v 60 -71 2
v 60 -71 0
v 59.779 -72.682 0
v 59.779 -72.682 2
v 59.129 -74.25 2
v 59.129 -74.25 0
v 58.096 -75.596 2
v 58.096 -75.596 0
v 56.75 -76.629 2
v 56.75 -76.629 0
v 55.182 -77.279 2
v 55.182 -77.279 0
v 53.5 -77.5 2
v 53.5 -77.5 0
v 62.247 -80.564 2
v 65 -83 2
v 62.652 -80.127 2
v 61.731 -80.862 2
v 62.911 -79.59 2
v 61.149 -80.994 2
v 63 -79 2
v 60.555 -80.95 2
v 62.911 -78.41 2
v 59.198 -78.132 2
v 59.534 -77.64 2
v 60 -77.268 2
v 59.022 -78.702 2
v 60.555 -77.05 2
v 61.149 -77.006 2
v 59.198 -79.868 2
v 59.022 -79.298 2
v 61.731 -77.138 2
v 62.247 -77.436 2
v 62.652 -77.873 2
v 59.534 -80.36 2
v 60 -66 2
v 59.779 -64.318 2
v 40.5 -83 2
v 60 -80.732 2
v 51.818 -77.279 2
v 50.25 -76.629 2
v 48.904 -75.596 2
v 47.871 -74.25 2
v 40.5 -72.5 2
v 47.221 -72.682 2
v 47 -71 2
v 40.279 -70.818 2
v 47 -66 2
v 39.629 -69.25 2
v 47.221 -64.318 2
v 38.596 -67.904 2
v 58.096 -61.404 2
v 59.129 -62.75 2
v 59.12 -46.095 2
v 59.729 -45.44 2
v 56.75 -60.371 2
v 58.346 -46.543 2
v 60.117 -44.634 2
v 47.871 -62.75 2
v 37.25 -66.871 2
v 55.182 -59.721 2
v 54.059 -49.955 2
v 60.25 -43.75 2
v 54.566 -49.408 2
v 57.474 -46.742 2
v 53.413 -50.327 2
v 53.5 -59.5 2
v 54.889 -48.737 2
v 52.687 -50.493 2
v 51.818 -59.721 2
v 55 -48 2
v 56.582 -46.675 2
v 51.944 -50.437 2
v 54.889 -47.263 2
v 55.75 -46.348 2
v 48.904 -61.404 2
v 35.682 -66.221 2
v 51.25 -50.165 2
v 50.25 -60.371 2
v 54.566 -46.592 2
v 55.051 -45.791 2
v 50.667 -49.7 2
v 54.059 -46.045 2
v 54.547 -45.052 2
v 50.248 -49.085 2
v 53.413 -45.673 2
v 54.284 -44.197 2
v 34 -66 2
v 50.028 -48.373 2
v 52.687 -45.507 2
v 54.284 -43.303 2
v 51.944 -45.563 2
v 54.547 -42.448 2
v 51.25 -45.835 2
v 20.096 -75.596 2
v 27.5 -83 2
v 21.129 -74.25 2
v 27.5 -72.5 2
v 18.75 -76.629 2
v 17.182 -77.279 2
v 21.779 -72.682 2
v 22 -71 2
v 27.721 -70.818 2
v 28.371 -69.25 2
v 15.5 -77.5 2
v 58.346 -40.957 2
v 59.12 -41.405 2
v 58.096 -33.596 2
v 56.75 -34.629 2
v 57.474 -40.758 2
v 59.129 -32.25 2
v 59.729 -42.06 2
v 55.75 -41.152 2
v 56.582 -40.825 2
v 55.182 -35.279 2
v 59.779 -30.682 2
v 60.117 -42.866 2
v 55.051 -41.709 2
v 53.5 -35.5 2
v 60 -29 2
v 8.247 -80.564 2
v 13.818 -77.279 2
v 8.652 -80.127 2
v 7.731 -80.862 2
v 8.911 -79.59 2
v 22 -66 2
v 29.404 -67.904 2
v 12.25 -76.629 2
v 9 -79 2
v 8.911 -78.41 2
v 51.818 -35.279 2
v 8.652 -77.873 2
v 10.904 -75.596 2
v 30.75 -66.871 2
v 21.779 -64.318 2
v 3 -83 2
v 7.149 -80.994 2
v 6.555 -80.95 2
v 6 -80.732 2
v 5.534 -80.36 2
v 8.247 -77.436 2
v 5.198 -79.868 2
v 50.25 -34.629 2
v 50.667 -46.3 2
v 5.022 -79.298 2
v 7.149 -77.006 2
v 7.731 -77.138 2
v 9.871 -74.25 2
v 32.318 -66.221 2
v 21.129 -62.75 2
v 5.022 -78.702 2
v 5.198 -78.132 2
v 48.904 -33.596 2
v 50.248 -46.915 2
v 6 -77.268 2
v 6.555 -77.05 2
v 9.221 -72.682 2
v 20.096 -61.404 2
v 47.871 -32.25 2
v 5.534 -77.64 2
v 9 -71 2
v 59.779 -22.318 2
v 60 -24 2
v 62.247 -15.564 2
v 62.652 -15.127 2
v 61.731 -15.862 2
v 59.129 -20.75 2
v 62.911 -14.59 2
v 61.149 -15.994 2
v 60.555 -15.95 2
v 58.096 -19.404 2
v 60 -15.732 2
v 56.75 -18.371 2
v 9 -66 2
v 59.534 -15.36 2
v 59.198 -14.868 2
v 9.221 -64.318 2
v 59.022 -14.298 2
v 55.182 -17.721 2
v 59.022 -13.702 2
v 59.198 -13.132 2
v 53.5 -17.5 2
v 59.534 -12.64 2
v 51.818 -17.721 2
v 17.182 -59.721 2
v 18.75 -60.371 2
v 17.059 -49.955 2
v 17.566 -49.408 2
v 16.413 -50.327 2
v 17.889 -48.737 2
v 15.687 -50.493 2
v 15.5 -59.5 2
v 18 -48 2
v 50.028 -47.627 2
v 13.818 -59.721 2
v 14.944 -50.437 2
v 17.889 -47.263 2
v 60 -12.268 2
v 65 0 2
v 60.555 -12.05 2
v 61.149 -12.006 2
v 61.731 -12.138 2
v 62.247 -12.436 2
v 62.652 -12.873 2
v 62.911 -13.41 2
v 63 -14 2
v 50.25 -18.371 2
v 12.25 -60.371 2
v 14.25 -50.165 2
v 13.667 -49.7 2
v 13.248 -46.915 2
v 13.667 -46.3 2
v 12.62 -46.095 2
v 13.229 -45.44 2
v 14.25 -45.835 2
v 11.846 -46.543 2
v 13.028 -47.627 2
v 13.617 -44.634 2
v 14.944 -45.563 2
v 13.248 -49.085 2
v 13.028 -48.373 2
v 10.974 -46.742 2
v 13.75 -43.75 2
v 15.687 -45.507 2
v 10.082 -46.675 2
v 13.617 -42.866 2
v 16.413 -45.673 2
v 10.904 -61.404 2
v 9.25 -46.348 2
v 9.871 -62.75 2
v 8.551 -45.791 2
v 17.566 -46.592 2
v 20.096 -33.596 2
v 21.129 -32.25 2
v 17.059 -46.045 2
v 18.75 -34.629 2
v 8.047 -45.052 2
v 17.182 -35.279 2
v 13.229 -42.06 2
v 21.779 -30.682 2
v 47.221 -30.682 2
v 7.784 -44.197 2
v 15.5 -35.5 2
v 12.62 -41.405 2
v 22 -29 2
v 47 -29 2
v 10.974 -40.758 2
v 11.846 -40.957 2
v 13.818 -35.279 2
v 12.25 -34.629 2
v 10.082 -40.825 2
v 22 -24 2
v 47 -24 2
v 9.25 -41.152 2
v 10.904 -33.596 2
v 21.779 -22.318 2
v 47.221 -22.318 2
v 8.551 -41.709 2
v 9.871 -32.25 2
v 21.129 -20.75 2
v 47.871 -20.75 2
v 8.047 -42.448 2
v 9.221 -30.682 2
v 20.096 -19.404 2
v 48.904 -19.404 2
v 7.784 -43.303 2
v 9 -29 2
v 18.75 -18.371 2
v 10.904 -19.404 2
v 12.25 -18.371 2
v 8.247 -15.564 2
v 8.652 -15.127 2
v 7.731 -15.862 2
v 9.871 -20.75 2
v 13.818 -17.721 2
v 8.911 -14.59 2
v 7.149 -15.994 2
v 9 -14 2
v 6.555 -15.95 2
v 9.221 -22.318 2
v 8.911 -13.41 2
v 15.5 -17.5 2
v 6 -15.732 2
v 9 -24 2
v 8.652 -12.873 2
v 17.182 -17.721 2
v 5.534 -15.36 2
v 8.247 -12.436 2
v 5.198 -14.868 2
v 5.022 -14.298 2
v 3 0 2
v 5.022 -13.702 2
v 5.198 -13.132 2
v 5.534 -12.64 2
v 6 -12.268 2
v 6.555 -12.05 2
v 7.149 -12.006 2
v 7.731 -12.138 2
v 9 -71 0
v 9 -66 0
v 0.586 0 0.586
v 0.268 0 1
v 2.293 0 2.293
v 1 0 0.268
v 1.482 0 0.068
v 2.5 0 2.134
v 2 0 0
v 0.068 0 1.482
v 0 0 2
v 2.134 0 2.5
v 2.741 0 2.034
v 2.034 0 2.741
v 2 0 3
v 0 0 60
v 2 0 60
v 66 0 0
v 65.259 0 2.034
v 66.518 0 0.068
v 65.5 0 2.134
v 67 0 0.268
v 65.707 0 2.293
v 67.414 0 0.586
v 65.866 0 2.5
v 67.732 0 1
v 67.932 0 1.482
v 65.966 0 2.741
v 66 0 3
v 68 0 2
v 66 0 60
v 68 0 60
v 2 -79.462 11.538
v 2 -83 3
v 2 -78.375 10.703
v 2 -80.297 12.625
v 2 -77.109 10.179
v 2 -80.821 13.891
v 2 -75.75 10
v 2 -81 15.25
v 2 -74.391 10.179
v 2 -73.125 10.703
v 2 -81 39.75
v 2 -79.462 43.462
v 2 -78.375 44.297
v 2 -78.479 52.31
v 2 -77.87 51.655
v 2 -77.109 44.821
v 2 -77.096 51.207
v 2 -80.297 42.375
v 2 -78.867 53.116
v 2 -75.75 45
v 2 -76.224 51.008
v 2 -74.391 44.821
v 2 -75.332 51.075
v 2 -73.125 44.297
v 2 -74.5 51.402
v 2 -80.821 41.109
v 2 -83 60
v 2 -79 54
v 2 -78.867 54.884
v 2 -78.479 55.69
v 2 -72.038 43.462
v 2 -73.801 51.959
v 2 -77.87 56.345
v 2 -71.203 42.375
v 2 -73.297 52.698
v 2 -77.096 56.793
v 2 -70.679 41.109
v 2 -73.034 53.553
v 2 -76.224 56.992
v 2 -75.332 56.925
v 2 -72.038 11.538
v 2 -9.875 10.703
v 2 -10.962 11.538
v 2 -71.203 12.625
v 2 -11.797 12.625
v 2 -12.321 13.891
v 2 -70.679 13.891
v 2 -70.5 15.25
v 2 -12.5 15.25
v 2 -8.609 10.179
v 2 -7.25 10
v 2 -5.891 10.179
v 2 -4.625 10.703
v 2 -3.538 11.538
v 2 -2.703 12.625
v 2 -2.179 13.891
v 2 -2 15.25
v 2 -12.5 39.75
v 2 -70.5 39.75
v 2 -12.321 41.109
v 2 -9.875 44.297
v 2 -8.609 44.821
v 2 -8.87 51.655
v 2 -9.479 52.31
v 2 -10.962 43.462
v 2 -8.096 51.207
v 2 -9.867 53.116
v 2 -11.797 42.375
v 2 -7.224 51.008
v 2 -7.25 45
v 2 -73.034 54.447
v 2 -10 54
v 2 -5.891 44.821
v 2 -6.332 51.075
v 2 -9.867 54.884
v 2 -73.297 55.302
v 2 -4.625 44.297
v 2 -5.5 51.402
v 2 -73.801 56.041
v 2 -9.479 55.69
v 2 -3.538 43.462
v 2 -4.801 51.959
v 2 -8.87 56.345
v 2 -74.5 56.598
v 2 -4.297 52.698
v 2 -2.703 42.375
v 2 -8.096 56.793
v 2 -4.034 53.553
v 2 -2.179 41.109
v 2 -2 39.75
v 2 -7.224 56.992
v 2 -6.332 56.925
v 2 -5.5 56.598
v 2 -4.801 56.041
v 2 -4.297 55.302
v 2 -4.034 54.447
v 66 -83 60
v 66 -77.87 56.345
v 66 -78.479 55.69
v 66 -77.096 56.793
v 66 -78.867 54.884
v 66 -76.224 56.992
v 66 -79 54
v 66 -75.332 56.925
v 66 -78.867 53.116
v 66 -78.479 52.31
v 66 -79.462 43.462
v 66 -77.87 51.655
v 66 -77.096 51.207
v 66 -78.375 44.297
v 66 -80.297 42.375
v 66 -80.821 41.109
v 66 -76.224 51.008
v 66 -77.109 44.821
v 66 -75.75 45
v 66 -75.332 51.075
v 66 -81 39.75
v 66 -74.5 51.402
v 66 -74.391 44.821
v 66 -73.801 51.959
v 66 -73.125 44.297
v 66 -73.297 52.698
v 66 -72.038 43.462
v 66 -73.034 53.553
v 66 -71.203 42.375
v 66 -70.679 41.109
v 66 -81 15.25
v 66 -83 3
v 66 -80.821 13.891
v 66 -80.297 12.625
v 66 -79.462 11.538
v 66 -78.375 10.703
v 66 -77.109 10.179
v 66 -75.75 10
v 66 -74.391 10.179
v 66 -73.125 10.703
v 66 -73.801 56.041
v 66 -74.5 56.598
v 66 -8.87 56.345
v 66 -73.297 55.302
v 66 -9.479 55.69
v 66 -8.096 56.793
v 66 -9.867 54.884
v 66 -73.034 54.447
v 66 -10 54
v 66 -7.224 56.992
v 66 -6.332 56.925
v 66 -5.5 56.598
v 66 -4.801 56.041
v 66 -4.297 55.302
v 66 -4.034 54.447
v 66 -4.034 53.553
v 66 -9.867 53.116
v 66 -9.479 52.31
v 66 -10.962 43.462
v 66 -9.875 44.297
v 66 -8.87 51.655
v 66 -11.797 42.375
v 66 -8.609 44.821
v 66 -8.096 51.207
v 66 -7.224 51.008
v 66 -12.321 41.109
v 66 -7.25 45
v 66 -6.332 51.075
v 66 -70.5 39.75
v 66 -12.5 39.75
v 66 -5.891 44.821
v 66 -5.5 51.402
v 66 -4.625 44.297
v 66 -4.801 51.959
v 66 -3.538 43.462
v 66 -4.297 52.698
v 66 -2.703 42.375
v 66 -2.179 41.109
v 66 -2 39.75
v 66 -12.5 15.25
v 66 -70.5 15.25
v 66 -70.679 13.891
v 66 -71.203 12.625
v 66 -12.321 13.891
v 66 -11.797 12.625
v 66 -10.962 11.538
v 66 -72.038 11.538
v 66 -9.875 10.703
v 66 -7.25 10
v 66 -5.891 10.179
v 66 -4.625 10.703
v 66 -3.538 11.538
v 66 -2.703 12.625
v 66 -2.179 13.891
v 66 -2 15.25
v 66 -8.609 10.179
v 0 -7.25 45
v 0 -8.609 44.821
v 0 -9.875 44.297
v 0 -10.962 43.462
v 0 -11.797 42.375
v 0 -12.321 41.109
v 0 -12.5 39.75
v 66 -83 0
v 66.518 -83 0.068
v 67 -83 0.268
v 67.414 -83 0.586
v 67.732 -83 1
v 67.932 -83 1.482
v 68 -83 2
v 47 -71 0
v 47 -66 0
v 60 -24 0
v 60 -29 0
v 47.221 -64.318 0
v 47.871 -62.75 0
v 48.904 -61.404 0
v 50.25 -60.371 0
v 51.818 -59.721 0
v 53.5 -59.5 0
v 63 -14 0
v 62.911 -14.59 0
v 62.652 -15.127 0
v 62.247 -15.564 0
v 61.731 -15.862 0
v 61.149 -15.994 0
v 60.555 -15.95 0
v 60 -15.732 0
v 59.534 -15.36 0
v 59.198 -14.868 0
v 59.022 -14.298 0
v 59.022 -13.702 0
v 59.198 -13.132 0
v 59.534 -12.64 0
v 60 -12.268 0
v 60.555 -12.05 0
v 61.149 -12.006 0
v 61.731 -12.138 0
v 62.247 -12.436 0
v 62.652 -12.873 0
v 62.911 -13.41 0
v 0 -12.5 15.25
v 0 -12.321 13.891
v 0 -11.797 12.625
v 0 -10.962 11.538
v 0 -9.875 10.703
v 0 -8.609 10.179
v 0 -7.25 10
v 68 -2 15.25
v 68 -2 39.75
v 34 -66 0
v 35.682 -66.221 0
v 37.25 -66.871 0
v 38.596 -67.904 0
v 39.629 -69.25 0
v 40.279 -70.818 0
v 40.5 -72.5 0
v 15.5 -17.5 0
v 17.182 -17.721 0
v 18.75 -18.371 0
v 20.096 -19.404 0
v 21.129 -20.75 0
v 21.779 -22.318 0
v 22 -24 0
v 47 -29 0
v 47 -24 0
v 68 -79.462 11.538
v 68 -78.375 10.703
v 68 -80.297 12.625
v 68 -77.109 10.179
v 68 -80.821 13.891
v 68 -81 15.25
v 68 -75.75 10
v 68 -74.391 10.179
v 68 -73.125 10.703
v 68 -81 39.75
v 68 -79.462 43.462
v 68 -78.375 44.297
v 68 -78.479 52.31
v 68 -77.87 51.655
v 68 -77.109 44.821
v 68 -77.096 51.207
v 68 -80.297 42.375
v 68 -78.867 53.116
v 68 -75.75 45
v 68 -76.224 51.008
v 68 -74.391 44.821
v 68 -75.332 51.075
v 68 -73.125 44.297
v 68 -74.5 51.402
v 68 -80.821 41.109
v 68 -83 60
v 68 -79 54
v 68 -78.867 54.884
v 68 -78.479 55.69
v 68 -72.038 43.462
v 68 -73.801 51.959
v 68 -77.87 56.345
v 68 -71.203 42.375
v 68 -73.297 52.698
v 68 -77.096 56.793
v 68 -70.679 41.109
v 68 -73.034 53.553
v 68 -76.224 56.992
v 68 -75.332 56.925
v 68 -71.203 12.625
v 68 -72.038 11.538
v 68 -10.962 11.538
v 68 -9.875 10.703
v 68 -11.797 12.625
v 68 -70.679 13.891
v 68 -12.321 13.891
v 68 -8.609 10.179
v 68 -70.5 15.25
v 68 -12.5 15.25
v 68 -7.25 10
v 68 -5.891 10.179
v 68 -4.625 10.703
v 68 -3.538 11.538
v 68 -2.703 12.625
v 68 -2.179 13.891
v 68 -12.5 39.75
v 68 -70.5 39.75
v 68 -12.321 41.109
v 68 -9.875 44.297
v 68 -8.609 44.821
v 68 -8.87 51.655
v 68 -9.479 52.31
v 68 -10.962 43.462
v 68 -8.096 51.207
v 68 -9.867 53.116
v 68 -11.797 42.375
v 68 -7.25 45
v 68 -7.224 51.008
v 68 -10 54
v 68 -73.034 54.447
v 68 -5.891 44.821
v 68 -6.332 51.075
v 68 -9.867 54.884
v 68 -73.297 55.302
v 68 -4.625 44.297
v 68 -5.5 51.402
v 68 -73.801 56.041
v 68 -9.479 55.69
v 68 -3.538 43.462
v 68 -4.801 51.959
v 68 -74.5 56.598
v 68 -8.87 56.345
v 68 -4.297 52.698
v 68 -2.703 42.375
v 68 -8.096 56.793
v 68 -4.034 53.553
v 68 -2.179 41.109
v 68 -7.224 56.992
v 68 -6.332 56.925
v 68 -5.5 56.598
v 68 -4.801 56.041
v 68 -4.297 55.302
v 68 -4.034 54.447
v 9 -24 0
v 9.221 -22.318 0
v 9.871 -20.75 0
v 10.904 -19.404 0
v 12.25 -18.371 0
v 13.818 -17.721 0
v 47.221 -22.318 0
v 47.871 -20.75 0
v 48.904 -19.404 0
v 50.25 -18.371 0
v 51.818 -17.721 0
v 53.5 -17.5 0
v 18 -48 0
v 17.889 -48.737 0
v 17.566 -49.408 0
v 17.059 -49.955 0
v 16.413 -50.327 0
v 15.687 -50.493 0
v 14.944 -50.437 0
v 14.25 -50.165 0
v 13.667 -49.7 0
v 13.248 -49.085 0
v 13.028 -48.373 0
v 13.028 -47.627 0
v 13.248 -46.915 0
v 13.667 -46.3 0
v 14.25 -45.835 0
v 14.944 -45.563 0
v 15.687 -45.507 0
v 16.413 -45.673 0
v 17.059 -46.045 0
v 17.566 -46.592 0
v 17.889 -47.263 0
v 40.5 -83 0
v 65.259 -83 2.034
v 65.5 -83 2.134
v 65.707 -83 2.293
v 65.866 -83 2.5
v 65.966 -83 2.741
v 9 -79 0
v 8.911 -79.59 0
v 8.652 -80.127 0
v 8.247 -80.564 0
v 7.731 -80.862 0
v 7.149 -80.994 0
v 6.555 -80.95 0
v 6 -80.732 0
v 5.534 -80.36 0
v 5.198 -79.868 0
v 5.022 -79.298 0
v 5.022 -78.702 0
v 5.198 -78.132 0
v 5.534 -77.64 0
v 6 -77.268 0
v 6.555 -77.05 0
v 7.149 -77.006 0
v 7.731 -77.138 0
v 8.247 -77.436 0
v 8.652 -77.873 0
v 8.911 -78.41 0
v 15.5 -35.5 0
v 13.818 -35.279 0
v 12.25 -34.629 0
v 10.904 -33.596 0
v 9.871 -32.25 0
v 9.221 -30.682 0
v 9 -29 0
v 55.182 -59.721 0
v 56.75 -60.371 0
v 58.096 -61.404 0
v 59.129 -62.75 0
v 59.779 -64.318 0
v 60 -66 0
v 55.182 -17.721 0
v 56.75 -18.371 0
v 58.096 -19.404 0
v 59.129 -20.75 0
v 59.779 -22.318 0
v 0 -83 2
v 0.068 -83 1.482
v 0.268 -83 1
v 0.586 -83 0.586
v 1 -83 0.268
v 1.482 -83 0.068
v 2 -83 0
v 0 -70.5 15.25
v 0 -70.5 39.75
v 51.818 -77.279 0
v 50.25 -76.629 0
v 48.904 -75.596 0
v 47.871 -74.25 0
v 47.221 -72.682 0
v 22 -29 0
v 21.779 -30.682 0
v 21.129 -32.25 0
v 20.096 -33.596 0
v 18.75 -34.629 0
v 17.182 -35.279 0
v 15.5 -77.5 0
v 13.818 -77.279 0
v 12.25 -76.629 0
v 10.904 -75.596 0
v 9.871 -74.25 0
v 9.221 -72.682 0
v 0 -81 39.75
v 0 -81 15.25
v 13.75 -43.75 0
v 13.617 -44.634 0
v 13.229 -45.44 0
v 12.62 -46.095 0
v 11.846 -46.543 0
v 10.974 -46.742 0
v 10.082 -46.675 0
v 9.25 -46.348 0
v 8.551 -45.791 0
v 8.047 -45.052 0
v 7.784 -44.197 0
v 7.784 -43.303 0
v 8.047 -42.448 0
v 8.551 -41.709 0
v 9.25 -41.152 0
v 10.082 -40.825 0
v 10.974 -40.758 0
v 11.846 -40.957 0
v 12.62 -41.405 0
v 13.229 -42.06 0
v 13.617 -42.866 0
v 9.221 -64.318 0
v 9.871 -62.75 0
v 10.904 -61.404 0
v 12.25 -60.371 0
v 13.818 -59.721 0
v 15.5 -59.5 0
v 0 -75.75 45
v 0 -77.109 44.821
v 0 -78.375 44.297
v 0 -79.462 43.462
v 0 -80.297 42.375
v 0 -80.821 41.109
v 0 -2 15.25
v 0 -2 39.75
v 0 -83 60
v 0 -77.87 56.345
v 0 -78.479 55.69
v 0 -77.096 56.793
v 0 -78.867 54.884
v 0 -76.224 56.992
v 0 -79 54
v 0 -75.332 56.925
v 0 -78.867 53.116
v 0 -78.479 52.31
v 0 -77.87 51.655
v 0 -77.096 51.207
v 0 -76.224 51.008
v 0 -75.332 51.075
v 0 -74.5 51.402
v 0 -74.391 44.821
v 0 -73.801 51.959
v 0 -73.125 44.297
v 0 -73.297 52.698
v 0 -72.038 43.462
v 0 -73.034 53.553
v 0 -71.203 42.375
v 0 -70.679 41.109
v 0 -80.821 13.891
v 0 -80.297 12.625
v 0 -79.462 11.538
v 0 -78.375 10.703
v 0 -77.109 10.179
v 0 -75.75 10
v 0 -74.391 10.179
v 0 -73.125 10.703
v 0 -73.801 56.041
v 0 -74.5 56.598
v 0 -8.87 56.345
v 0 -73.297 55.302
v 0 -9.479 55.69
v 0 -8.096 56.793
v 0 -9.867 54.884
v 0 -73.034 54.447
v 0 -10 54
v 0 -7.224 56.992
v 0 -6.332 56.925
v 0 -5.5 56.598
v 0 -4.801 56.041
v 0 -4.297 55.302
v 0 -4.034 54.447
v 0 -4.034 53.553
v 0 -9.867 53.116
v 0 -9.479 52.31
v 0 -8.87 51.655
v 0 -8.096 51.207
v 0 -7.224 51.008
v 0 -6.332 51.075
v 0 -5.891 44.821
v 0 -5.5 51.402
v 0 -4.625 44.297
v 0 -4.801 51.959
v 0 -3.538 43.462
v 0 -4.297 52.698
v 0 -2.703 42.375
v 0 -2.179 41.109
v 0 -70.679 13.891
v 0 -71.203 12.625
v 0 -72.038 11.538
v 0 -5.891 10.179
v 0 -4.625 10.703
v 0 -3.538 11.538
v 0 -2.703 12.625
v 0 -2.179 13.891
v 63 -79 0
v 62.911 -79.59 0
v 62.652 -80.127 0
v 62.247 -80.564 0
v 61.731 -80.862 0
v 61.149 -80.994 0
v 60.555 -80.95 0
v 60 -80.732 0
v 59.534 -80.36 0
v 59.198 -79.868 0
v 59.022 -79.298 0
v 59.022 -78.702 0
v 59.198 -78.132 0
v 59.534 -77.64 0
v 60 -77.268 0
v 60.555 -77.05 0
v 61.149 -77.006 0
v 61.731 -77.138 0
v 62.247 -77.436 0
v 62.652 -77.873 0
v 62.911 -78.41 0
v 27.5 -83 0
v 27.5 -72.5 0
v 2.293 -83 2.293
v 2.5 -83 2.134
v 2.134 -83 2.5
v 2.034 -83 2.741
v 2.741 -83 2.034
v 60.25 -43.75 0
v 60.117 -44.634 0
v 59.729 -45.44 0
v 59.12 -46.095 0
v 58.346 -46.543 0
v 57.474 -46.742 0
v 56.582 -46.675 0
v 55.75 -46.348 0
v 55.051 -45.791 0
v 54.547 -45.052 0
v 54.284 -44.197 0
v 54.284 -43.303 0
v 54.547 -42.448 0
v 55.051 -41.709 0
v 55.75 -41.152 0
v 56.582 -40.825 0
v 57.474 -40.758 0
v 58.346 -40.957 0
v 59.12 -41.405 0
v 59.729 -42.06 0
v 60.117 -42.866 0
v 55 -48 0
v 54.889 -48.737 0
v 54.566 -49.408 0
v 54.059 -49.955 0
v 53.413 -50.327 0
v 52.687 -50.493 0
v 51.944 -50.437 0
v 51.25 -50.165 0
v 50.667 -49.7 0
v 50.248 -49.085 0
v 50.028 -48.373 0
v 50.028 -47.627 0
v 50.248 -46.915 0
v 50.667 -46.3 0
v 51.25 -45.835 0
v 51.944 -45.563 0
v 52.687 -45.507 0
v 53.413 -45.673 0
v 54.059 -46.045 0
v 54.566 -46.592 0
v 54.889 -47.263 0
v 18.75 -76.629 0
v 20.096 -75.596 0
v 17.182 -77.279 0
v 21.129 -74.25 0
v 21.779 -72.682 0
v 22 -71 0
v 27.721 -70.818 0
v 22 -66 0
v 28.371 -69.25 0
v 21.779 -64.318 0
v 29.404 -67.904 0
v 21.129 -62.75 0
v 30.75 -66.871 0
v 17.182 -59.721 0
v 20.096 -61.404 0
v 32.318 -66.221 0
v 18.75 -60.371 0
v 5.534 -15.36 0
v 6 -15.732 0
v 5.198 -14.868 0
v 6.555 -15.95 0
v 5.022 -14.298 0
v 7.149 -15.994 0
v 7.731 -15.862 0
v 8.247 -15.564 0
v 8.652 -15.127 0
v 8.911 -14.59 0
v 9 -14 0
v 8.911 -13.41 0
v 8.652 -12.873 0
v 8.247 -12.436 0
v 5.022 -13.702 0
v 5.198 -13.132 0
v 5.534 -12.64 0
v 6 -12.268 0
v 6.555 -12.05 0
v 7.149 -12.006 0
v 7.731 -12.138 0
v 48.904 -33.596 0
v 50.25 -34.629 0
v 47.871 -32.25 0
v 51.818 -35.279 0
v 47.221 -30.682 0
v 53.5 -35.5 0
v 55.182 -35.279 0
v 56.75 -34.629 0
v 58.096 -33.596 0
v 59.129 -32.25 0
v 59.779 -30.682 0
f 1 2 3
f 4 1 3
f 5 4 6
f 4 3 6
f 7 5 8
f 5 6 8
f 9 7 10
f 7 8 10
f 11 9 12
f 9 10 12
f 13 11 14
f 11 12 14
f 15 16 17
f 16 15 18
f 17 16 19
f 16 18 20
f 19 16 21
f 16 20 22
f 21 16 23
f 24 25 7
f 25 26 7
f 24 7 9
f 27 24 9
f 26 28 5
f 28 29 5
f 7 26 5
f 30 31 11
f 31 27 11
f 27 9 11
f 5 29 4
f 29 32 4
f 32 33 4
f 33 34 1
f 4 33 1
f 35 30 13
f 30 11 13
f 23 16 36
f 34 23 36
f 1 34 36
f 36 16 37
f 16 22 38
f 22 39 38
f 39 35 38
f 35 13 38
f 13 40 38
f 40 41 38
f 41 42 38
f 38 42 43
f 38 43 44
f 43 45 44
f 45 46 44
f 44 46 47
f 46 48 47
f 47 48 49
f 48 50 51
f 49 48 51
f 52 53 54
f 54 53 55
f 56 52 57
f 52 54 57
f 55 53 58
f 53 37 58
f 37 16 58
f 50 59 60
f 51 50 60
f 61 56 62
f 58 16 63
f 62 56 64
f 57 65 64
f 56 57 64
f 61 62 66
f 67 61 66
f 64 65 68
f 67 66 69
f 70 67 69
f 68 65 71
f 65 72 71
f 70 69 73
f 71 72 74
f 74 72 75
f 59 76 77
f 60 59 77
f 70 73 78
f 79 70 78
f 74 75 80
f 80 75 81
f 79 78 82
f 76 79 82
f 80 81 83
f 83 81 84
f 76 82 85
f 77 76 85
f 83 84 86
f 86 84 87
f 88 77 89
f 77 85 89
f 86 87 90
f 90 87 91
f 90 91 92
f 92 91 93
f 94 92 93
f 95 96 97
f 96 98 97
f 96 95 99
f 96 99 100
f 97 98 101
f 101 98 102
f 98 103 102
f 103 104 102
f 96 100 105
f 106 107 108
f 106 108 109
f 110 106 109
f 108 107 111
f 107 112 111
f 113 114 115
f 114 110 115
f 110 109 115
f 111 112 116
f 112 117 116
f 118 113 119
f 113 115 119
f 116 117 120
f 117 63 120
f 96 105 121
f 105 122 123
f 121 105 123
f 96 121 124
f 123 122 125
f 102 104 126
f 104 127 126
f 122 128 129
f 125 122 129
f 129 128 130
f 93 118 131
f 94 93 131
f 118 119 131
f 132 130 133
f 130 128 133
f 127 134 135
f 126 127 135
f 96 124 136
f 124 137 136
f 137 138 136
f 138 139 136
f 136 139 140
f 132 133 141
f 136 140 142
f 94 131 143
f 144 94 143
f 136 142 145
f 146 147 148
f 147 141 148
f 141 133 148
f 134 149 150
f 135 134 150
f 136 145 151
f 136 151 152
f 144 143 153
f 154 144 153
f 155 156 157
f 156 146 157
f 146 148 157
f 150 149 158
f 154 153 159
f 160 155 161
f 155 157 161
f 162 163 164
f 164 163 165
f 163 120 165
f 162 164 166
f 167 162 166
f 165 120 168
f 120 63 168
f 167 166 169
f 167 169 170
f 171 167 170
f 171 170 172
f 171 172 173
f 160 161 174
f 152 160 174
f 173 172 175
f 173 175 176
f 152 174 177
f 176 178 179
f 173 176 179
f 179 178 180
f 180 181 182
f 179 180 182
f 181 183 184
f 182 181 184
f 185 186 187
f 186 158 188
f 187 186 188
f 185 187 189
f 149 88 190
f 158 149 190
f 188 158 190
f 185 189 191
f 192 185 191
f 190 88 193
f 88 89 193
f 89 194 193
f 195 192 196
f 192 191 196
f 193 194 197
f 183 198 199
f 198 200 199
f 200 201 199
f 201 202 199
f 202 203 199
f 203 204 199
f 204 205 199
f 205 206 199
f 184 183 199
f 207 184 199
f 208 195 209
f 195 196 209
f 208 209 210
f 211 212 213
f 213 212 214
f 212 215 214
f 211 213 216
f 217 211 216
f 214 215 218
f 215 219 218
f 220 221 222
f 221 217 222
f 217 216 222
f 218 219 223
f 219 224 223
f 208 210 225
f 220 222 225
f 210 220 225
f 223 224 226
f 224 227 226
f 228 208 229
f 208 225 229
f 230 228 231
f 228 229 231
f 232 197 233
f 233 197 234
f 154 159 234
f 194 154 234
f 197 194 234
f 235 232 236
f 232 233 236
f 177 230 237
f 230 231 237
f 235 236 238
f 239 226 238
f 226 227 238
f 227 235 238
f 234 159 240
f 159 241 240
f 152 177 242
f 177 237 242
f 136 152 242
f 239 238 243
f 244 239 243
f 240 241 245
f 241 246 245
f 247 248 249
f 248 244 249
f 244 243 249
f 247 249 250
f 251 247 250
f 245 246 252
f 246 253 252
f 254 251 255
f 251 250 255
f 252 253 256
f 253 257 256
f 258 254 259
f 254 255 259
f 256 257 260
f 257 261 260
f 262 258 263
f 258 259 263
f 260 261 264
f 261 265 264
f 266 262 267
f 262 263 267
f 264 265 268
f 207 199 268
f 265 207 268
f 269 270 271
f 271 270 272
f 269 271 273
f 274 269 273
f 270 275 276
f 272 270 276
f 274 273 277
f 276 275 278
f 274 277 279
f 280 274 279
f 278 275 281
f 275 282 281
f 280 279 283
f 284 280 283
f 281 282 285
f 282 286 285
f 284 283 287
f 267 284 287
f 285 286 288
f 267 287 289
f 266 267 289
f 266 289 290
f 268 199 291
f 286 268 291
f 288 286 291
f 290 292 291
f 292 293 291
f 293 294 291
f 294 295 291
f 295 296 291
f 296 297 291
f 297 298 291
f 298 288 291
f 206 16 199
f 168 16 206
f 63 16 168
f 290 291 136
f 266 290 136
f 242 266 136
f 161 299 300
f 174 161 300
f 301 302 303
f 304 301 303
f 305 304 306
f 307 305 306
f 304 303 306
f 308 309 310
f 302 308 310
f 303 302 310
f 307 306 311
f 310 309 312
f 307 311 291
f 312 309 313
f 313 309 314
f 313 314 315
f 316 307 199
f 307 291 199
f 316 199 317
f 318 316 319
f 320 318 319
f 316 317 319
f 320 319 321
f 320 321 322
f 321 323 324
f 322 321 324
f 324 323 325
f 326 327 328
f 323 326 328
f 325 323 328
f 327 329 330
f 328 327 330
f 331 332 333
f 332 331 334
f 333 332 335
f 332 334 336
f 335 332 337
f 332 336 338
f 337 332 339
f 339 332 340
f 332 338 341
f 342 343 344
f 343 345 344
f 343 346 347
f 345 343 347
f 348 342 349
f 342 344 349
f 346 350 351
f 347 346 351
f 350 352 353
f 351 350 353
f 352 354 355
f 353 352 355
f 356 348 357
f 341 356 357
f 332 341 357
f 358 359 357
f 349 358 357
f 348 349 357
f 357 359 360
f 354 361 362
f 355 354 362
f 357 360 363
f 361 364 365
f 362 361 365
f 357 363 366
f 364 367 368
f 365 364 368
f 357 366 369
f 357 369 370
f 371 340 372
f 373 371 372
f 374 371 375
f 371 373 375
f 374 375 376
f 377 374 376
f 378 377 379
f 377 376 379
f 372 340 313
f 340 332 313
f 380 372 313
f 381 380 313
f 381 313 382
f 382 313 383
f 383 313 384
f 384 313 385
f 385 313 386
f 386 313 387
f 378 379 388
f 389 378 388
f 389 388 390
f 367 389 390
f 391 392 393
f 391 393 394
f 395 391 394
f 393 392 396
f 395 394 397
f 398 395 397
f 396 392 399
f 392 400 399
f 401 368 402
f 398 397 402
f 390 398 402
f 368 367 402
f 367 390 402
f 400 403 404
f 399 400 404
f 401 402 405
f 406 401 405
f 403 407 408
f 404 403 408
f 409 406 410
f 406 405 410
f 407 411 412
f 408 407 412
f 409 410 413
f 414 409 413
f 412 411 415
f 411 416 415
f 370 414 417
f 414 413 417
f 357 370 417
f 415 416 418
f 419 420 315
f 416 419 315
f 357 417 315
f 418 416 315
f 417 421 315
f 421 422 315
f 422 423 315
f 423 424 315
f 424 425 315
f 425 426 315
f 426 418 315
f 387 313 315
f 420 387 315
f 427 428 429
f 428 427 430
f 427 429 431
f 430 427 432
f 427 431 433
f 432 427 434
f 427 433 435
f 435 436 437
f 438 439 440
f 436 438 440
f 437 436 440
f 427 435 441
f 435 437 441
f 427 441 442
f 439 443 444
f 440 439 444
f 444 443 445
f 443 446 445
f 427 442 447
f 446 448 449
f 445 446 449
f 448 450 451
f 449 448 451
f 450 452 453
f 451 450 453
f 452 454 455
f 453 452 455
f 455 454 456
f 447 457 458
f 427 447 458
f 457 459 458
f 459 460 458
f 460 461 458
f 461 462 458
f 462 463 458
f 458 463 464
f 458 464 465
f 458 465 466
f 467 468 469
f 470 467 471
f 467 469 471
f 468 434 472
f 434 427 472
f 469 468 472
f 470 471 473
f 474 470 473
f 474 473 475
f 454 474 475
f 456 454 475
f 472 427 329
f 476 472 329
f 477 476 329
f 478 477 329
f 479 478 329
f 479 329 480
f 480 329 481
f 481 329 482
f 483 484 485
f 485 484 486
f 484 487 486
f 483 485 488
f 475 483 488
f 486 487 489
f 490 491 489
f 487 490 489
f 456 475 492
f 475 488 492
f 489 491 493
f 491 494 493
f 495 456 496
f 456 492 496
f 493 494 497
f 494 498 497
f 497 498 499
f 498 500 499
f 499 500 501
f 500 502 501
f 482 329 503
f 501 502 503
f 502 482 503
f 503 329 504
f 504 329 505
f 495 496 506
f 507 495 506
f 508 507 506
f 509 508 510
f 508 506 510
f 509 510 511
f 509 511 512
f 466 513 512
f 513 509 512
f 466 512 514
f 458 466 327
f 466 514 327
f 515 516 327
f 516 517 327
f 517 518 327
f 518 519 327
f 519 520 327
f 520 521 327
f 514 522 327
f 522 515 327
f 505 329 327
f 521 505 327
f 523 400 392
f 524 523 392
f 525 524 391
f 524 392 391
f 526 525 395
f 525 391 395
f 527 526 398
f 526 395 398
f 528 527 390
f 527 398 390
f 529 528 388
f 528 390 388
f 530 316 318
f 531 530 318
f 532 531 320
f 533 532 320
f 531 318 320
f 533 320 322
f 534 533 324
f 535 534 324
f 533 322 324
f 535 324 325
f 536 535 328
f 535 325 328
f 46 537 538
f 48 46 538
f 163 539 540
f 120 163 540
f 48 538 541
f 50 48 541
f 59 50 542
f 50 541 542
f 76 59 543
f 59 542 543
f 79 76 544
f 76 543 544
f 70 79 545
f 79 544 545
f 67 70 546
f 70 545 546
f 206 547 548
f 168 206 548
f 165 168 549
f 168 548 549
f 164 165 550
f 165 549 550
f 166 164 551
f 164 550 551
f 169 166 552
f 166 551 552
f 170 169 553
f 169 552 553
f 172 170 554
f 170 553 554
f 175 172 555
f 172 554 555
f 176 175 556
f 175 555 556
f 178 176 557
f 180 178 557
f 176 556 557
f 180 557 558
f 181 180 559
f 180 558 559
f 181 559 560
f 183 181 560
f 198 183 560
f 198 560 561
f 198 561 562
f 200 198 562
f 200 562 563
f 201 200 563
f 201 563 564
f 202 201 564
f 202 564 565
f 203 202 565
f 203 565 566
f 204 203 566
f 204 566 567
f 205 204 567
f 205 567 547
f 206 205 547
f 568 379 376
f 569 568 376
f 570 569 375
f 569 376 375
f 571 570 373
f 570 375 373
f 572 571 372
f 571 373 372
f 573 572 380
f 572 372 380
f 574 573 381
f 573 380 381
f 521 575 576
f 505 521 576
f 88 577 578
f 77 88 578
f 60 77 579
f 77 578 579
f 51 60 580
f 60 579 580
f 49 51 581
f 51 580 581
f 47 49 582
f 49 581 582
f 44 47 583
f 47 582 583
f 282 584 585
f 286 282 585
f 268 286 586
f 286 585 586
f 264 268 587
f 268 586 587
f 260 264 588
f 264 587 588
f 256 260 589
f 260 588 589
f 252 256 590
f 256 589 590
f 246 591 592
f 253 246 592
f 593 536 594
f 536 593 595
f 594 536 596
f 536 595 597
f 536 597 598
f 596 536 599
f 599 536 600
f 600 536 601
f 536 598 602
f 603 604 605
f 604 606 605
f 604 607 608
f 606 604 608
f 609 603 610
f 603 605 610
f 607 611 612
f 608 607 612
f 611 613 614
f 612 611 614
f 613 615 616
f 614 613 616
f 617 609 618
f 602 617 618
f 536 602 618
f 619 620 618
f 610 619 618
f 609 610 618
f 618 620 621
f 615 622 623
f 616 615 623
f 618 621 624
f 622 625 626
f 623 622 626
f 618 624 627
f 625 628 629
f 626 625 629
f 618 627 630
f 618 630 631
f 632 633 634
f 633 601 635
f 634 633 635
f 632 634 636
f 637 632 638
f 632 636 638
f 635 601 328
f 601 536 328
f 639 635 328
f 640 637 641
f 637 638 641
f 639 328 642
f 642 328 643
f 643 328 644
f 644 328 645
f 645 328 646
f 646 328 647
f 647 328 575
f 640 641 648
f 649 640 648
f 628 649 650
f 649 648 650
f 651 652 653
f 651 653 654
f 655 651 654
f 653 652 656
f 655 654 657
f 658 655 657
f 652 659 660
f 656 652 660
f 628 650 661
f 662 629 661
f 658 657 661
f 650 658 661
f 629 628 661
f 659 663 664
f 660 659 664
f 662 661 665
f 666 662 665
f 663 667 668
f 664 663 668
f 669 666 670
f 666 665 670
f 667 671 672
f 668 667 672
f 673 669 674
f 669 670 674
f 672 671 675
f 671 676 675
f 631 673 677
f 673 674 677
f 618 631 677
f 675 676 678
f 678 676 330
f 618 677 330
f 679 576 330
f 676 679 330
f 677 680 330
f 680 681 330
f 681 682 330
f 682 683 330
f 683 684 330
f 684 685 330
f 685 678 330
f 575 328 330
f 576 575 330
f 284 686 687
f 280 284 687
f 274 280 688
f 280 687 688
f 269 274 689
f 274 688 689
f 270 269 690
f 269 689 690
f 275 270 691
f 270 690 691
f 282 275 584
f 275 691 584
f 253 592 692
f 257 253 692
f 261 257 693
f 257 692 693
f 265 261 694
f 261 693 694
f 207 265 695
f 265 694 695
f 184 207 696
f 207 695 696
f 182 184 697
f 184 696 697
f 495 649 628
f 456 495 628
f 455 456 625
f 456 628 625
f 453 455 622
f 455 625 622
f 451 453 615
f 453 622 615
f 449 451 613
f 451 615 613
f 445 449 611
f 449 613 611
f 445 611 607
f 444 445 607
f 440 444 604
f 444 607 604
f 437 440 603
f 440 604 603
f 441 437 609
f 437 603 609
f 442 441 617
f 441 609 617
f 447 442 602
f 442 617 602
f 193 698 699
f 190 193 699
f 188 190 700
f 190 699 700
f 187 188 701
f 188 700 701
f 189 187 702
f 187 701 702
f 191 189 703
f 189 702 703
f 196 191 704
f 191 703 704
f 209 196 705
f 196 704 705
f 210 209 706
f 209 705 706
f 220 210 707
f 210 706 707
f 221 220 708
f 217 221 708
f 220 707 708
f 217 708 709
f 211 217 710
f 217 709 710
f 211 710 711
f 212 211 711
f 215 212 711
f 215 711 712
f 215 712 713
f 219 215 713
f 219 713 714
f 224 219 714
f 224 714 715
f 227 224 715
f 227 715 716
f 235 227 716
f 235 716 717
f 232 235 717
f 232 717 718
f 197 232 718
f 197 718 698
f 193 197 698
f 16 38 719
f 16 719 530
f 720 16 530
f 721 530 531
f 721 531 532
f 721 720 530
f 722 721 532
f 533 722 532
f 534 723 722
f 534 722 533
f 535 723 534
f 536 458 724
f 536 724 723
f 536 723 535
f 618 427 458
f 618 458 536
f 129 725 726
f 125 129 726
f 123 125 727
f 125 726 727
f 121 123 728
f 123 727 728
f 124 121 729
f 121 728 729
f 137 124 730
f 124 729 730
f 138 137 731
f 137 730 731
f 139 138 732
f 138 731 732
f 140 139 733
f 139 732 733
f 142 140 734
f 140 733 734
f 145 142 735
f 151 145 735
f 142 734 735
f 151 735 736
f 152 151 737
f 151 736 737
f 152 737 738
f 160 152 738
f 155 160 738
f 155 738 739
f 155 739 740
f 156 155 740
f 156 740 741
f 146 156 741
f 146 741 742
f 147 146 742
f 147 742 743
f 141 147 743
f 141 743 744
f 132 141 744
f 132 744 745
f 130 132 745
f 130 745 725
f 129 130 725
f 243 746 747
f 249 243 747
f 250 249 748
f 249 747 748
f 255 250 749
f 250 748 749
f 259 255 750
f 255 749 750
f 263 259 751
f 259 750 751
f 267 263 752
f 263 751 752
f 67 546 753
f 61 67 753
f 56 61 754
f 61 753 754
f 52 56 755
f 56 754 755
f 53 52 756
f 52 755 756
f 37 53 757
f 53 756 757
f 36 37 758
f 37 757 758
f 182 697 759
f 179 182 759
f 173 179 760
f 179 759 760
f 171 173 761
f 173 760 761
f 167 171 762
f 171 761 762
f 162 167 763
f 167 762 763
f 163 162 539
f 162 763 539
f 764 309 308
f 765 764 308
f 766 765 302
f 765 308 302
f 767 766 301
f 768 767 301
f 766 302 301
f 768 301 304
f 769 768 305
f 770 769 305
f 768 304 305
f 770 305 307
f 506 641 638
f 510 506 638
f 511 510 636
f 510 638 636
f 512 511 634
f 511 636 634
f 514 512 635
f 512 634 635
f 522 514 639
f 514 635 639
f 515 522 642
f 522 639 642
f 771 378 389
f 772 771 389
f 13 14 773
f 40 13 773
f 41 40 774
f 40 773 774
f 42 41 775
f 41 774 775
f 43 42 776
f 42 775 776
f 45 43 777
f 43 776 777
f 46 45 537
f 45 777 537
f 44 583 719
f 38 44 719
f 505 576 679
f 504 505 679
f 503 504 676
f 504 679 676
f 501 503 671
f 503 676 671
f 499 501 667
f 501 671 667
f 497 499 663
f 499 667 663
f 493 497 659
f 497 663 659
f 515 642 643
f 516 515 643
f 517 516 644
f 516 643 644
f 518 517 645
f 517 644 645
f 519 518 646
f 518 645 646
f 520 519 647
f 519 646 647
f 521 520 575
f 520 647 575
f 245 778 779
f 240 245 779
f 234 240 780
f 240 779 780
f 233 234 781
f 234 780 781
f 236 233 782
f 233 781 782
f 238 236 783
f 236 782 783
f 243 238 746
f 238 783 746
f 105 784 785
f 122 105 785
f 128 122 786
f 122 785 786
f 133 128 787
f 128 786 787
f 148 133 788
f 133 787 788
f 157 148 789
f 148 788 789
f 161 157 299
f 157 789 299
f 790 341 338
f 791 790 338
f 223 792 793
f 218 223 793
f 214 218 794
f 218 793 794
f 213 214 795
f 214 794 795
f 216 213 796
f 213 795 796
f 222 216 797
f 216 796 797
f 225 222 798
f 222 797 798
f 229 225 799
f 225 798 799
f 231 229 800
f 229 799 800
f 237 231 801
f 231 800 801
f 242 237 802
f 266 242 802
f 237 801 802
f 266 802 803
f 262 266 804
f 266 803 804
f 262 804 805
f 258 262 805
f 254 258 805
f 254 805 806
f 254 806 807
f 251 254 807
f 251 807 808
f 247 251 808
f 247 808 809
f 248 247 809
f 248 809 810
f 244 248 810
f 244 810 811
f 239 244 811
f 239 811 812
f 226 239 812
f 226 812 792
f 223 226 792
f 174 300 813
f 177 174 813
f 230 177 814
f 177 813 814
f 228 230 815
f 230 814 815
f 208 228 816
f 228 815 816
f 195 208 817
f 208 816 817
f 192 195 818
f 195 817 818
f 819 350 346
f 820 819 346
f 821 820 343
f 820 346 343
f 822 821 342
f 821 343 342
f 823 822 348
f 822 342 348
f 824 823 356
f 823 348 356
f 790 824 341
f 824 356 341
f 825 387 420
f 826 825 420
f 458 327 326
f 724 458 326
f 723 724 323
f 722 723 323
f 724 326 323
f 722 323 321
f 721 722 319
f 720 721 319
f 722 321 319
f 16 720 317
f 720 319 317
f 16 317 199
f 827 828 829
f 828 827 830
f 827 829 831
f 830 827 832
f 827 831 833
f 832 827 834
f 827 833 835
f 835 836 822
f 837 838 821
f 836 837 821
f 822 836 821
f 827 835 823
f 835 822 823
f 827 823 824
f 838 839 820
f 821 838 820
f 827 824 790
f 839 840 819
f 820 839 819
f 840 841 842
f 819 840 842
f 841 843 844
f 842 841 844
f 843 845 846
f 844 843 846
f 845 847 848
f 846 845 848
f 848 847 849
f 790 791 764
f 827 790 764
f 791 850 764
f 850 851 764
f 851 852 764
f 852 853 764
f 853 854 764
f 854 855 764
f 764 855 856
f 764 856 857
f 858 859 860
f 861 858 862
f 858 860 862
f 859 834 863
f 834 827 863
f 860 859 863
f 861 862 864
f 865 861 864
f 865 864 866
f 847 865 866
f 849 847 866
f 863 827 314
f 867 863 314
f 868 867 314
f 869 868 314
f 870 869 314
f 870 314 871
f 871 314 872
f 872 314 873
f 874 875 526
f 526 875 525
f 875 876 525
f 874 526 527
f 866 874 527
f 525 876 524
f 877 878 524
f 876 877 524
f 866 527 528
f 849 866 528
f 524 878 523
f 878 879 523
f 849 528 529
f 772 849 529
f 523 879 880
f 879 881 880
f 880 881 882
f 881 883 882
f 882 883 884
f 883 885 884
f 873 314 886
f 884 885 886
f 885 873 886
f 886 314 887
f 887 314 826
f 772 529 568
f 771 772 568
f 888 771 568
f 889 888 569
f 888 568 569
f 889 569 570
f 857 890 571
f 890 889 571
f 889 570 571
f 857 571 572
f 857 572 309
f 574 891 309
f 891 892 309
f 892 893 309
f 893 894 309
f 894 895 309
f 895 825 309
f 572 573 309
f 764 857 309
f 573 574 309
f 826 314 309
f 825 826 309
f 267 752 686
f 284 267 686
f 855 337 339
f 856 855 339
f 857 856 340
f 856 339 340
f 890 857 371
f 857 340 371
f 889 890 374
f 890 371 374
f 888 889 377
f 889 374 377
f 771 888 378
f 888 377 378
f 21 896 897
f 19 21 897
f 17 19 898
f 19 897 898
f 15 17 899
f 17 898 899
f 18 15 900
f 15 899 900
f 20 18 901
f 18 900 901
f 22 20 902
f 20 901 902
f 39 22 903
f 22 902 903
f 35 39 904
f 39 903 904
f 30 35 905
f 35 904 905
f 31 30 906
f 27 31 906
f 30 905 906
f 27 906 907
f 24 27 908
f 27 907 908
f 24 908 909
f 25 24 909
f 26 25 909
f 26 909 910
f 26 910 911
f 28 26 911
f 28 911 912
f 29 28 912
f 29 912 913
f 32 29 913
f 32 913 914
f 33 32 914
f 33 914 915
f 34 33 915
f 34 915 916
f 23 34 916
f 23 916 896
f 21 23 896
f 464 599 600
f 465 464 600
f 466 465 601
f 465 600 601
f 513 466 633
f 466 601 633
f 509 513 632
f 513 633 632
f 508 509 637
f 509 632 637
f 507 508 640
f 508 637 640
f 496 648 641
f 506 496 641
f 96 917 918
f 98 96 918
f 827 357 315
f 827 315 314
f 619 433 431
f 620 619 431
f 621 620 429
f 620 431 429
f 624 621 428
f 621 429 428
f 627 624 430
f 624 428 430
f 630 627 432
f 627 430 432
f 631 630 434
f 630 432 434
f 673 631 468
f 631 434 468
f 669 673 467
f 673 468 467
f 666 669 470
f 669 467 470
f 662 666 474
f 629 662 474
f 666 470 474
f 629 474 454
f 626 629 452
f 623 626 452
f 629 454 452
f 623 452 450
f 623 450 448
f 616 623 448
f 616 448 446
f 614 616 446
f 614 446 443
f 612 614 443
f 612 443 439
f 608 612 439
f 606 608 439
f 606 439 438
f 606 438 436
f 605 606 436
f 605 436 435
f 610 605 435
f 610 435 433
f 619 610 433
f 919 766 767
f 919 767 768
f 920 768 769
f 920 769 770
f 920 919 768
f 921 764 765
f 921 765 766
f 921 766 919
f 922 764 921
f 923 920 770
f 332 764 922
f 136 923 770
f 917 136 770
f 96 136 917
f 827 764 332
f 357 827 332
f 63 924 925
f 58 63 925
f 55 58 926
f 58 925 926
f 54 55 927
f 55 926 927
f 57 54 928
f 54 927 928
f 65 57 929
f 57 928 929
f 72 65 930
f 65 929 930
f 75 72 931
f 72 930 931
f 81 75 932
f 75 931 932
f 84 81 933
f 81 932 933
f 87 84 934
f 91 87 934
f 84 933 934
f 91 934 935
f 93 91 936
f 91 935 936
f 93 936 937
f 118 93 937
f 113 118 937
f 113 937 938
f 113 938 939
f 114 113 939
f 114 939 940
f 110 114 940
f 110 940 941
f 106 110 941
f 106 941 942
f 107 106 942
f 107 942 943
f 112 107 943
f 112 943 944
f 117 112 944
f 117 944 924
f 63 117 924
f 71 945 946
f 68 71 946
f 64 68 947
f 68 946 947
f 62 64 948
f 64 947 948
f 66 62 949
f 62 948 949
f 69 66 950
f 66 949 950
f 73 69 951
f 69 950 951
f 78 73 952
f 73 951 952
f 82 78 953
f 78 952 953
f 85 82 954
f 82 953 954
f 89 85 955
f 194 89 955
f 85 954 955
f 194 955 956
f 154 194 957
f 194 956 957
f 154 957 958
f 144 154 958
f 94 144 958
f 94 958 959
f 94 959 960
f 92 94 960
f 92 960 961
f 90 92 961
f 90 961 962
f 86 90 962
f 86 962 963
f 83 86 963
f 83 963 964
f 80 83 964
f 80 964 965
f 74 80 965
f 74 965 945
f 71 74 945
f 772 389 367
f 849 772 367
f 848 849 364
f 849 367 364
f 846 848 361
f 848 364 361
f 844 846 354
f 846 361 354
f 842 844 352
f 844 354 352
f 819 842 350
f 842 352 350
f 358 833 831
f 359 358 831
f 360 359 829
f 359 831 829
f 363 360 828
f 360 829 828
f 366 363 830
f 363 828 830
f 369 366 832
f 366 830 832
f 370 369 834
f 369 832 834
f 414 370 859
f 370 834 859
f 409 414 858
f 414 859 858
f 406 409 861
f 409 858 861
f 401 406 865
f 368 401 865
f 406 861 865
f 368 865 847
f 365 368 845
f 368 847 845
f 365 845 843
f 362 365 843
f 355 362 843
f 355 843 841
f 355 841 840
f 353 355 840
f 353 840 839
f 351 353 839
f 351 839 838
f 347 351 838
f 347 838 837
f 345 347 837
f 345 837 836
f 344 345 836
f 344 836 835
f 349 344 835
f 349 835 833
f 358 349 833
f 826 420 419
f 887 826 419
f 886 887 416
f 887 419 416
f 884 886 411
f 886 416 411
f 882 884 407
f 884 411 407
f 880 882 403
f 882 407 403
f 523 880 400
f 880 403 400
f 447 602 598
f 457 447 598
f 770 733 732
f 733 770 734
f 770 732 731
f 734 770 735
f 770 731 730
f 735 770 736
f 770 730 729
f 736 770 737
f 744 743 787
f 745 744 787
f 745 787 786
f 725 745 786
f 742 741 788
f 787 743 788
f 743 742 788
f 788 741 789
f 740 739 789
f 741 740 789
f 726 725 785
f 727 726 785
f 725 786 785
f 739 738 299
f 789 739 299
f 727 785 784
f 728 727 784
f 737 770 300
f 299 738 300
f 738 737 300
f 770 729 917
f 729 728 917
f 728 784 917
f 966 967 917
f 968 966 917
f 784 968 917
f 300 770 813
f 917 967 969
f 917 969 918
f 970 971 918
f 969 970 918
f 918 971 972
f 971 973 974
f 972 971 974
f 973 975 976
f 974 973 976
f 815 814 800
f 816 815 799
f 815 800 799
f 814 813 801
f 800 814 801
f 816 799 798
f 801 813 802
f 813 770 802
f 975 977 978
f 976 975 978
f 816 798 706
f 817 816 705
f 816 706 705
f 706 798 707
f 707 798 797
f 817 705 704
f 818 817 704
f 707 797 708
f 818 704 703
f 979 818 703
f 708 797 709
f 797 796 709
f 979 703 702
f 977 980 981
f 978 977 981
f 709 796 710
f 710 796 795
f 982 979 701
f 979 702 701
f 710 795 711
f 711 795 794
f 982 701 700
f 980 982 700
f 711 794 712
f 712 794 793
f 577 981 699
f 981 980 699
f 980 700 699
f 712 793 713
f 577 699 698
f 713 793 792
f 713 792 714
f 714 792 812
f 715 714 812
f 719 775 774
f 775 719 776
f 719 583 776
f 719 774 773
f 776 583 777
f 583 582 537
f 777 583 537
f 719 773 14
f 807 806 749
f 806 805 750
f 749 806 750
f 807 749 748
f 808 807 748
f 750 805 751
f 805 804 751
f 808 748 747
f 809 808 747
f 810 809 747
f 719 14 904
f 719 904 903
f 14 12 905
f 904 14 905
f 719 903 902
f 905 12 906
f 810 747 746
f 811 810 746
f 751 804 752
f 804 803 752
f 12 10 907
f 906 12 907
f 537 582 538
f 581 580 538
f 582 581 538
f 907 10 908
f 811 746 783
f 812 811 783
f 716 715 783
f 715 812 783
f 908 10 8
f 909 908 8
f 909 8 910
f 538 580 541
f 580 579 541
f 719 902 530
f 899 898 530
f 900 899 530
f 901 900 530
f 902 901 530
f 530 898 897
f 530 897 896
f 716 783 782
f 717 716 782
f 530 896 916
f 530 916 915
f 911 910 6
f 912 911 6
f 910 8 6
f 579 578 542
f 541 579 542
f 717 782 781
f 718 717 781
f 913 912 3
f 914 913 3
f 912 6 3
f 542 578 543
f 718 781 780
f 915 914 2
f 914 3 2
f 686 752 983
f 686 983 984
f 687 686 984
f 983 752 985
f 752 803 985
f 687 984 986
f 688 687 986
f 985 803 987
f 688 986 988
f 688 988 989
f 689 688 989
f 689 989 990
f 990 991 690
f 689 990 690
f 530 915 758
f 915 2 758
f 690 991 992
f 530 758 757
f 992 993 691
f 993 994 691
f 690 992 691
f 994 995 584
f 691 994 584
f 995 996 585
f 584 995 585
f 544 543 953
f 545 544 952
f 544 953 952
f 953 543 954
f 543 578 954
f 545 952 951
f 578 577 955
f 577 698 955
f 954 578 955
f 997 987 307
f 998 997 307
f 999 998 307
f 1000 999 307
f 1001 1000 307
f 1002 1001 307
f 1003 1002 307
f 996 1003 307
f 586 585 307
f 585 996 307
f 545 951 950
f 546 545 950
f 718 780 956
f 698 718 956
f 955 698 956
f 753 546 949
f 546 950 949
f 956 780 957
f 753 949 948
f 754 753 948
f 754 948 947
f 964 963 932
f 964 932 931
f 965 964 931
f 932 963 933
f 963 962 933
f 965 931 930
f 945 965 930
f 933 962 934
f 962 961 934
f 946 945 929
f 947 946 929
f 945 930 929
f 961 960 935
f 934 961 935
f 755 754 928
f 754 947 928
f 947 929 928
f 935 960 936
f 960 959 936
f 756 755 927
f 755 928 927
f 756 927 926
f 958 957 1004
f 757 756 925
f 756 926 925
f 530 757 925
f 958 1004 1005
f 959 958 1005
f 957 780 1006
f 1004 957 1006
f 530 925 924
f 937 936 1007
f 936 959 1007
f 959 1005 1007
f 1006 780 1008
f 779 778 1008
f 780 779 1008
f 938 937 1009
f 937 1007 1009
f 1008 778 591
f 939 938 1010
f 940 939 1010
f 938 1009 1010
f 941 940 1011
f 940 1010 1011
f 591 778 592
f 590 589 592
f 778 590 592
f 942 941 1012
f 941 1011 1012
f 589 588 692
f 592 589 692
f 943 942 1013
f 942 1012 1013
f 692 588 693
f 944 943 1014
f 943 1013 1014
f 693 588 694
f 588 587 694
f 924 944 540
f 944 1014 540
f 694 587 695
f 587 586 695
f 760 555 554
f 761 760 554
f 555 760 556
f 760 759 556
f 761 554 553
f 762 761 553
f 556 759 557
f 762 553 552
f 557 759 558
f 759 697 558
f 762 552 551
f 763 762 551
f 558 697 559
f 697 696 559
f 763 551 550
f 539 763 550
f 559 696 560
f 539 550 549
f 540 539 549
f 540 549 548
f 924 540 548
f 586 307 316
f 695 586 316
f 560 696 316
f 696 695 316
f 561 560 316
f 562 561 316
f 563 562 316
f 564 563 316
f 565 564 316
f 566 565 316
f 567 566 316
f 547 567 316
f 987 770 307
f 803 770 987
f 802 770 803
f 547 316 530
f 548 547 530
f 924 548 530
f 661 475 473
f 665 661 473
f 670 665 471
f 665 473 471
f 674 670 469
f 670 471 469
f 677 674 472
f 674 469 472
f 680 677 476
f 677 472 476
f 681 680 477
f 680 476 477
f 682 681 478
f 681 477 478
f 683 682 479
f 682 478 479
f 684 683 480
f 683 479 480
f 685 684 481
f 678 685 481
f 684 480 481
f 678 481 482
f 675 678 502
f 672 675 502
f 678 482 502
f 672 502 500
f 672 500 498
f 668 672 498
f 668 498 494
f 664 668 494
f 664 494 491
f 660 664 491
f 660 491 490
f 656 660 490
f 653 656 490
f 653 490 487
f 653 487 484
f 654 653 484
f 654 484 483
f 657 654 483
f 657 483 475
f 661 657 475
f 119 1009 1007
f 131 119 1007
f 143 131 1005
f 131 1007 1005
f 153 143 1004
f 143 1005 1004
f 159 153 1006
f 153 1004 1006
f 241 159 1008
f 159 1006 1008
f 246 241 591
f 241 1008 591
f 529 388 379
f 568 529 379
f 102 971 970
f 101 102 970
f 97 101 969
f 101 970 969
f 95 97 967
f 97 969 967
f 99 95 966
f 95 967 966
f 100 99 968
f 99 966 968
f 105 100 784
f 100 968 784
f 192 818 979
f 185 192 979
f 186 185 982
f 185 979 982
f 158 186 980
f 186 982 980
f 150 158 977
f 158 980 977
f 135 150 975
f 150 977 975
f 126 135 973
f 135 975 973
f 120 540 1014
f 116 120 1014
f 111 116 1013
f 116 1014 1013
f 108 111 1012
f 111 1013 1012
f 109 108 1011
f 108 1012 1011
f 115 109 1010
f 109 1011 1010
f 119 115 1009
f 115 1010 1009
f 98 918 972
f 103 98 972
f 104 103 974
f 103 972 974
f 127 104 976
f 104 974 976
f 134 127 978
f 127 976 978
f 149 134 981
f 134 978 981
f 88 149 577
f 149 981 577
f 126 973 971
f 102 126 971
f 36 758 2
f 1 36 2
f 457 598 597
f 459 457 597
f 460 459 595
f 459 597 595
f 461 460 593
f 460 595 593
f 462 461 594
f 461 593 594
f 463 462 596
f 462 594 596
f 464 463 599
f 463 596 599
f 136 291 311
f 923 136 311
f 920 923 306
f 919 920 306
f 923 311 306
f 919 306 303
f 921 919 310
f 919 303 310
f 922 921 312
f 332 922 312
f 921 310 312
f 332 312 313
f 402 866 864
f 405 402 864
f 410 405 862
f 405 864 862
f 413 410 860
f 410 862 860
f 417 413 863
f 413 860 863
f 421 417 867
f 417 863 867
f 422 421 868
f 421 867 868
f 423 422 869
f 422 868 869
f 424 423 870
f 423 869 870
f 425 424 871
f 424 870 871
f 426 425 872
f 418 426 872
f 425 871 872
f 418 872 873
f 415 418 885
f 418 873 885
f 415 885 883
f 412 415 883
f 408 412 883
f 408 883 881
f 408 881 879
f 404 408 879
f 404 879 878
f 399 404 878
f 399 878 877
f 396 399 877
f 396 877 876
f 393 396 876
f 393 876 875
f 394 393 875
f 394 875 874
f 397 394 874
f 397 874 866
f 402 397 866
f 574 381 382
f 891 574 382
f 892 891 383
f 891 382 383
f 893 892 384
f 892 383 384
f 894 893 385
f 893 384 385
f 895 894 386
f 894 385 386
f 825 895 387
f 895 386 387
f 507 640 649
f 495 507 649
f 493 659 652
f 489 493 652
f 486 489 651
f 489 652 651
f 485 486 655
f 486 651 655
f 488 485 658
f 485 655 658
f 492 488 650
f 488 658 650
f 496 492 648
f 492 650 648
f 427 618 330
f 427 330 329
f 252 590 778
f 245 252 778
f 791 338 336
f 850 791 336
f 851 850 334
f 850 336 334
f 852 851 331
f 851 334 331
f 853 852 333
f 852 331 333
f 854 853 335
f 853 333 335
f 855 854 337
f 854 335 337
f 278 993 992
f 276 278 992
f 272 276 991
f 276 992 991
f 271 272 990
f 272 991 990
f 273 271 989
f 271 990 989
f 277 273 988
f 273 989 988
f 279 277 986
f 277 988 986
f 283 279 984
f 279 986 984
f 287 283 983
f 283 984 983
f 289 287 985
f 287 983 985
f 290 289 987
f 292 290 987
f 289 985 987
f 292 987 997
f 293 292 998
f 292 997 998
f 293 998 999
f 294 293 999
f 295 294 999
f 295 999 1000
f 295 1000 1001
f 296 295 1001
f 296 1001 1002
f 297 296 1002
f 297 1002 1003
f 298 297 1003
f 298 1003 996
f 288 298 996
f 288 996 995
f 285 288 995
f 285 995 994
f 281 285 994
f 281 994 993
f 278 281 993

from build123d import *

# Parameters (mm, degrees)
F1_DEPTH  = 83
F3_DEPTH  = 68.001
F5_DEPTH  = 60.001
F6_R      = 3
F7_DEPTH  = 60.001
F8_R      = 2.5
F9_DEPTH  = 60.001
F10_R     = 2
F11_DEPTH = 60.001
F13_DEPTH = 60.001
F14_R     = 3
F15_DEPTH = 68.001


with BuildPart() as f1:
    # F0 (on Front) → F1 (new body)
    with BuildSketch(Plane.XZ):
        with BuildLine():
            ThreePointArc((0, 2), (0.585786, 0.585786), (2, 0))
            Line((2, 0), (66, 0))
            ThreePointArc((66, 0), (67.414214, 0.585786), (68, 2))
            Line((68, 2), (68, 60))
            Line((68, 60), (66, 60))
            Line((66, 60), (66, 3))
            ThreePointArc((66, 3), (65.707107, 2.292893), (65, 2))
            Line((65, 2), (3, 2))
            ThreePointArc((3, 2), (2.292893, 2.292893), (2, 3))
            Line((2, 3), (2, 60))
            Line((2, 60), (0, 60))
            Line((0, 60), (0, 2))
        make_face()
    extrude(amount=F1_DEPTH)

    # F2 (on face) → F3 (cut, through all)
    with BuildSketch(Plane.YZ.offset(68)):
        with BuildLine():
            Line((-81, 39.75), (-81, 15.25))
            ThreePointArc((-81, 15.25), (-79.462311, 11.537689), (-75.75, 10))
            ThreePointArc((-75.75, 10), (-72.037689, 11.537689), (-70.5, 15.25))
            Line((-70.5, 15.25), (-70.5, 39.75))
            ThreePointArc((-70.5, 39.75), (-72.037689, 43.462311), (-75.75, 45))
            ThreePointArc((-75.75, 45), (-79.462311, 43.462311), (-81, 39.75))
        make_face()
        with BuildLine():
            ThreePointArc((-7.25, 45), (-10.962311, 43.462311), (-12.5, 39.75))
            Line((-12.5, 39.75), (-12.5, 15.25))
            ThreePointArc((-12.5, 15.25), (-10.962311, 11.537689), (-7.25, 10))
            ThreePointArc((-7.25, 10), (-3.537689, 11.537689), (-2, 15.25))
            Line((-2, 15.25), (-2, 39.75))
            ThreePointArc((-2, 39.75), (-3.537689, 43.462311), (-7.25, 45))
        make_face()
    extrude(amount=-F3_DEPTH, mode=Mode.SUBTRACT)

    # F4 (on face) → F5 (cut, through all)
    with BuildSketch(Plane(origin=(0, 0, 0), x_dir=(1, 0, 0), z_dir=(0, 0, -1))):
        with BuildLine():
            Line((9, 71), (9, 66))
            ThreePointArc((9, 66), (10.903806, 61.403806), (15.5, 59.5))
            ThreePointArc((15.5, 59.5), (20.096194, 61.403806), (22, 66))
            Line((22, 66), (22, 71))
            ThreePointArc((22, 71), (20.096194, 75.596194), (15.5, 77.5))
            ThreePointArc((15.5, 77.5), (10.903806, 75.596194), (9, 71))
        make_face()
        with BuildLine():
            Line((60, 66), (60, 71))
            ThreePointArc((60, 71), (58.096194, 75.596194), (53.5, 77.5))
            ThreePointArc((53.5, 77.5), (48.903806, 75.596194), (47, 71))
            Line((47, 71), (47, 66))
            ThreePointArc((47, 66), (48.903806, 61.403806), (53.5, 59.5))
            ThreePointArc((53.5, 59.5), (58.096194, 61.403806), (60, 66))
        make_face()
        with BuildLine():
            Line((60, 24), (60, 29))
            ThreePointArc((60, 29), (58.096194, 33.596194), (53.5, 35.5))
            ThreePointArc((53.5, 35.5), (48.903806, 33.596194), (47, 29))
            Line((47, 29), (47, 24))
            ThreePointArc((47, 24), (48.903806, 19.403806), (53.5, 17.5))
            ThreePointArc((53.5, 17.5), (58.096194, 19.403806), (60, 24))
        make_face()
        with BuildLine():
            Line((22, 24), (22, 29))
            ThreePointArc((22, 29), (20.096194, 33.596194), (15.5, 35.5))
            ThreePointArc((15.5, 35.5), (10.903806, 33.596194), (9, 29))
            Line((9, 29), (9, 24))
            ThreePointArc((9, 24), (10.903806, 19.403806), (15.5, 17.5))
            ThreePointArc((15.5, 17.5), (20.096194, 19.403806), (22, 24))
        make_face()
    extrude(amount=-F5_DEPTH, mode=Mode.SUBTRACT)

    # F6 (on face) → F7 (cut, through all)
    with BuildSketch(Plane(origin=(0, 0, 0), x_dir=(1, 0, 0), z_dir=(0, 0, -1))):
        with Locations((57.25, 43.75)):
            Circle(F6_R)
        with Locations((10.75, 43.75)):
            Circle(F6_R)
    extrude(amount=-F7_DEPTH, mode=Mode.SUBTRACT)

    # F8 (on face) → F9 (cut, through all)
    with BuildSketch(Plane(origin=(0, 0, 0), x_dir=(1, 0, 0), z_dir=(0, 0, -1))):
        with Locations((15.5, 48)):
            Circle(F8_R)
        with Locations((52.5, 48)):
            Circle(F8_R)
    extrude(amount=-F9_DEPTH, mode=Mode.SUBTRACT)

    # F10 (on face) → F11 (cut, through all)
    with BuildSketch(Plane(origin=(0, 0, 0), x_dir=(1, 0, 0), z_dir=(0, 0, -1))):
        with Locations((7, 79)):
            Circle(F10_R)
        with Locations((61, 79)):
            Circle(F10_R)
        with Locations((7, 14)):
            Circle(F10_R)
        with Locations((61, 14)):
            Circle(F10_R)
    extrude(amount=-F11_DEPTH, mode=Mode.SUBTRACT)

    # F12 (on face) → F13 (cut, through all)
    with BuildSketch(Plane(origin=(0, 0, 0), x_dir=(1, 0, 0), z_dir=(0, 0, -1))):
        with BuildLine():
            Line((40.5, 83), (27.5, 83))
            Line((27.5, 83), (27.5, 72.5))
            ThreePointArc((27.5, 72.5), (29.403806, 67.903806), (34, 66))
            ThreePointArc((34, 66), (38.596194, 67.903806), (40.5, 72.5))
            Line((40.5, 72.5), (40.5, 83))
        make_face()
    extrude(amount=-F13_DEPTH, mode=Mode.SUBTRACT)

    # F14 (on face) → F15 (cut, through all)
    with BuildSketch(Plane(origin=(0, 0, 0), x_dir=(0, -1, 0), z_dir=(-1, 0, 0))):
        with Locations((7, 54)):
            Circle(F14_R)
        with Locations((76, 54)):
            Circle(F14_R)
    extrude(amount=-F15_DEPTH, mode=Mode.SUBTRACT)


solid = f1.part
